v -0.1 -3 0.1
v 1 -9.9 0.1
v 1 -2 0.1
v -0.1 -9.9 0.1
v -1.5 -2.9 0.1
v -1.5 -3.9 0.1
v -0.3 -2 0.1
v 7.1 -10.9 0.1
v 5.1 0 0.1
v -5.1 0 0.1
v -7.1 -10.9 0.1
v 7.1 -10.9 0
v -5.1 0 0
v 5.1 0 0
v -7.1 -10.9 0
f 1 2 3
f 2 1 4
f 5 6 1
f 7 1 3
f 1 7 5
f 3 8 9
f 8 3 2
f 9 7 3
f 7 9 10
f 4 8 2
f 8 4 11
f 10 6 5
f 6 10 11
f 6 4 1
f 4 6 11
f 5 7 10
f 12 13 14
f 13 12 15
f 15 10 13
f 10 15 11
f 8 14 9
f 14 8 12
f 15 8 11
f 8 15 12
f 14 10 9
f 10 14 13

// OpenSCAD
use <../lib.scad>
function ldraw_lib__4141242a() = [
// 0 Sticker Minifig Torso with White "1"
// 0 Name: 4141242a.dat
// 0 Author: Michael Heidemann [mikeheide]
// 0 !LDRAW_ORG Part UPDATE 2013-02
// 0 !LICENSE Licensed under CC BY 4.0 : see CAreadme.txt
// 
// 0 BFC CERTIFY CCW
  [0,"BFC","CERTIFY"],
  [0,"BFC","CCW"],
// 
// 0 !HISTORY 2013-12-23 [PTadmin] Official Update 2013-02
// 
// 
// 4 15 2.5 -0.25 -24.75 2.5 -0.25 -5 -0.25 -0.25 -7.5 -0.25 -0.25 -24.75
  [4,15,2.5,-0.25,-24.75,2.5,-0.25,-5,-0.25,-0.25,-7.5,-0.25,-0.25,-24.75],
// 3 15 -3.75 -0.25 -7.25 -3.75 -0.25 -9.75 -0.25 -0.25 -7.5
  [3,15,-3.75,-0.25,-7.25,-3.75,-0.25,-9.75,-0.25,-0.25,-7.5],
// 4 15 -3.75 -0.25 -7.25 -0.25 -0.25 -7.5 2.5 -0.25 -5 -0.75 -0.25 -5
  [4,15,-3.75,-0.25,-7.25,-0.25,-0.25,-7.5,2.5,-0.25,-5,-0.75,-0.25,-5],
// 4 16 2.5 -0.25 -24.75 17.75 -0.25 -27.25 12.75 -0.25 0 2.5 -0.25 -5
  [4,16,2.5,-0.25,-24.75,17.75,-0.25,-27.25,12.75,-0.25,0,2.5,-0.25,-5],
// 4 16 12.75 -0.25 0 -12.75 -0.25 0 -0.75 -0.25 -5 2.5 -0.25 -5
  [4,16,12.75,-0.25,0,-12.75,-0.25,0,-0.75,-0.25,-5,2.5,-0.25,-5],
// 4 16 -0.25 -0.25 -24.75 -17.75 -0.25 -27.25 17.75 -0.25 -27.25 2.5 -0.25 -24.75
  [4,16,-0.25,-0.25,-24.75,-17.75,-0.25,-27.25,17.75,-0.25,-27.25,2.5,-0.25,-24.75],
// 4 16 -12.75 -0.25 0 -17.75 -0.25 -27.25 -3.75 -0.25 -9.75 -3.75 -0.25 -7.25
  [4,16,-12.75,-0.25,0,-17.75,-0.25,-27.25,-3.75,-0.25,-9.75,-3.75,-0.25,-7.25],
// 4 16 -0.25 -0.25 -24.75 -0.25 -0.25 -7.5 -3.75 -0.25 -9.75 -17.75 -0.25 -27.25
  [4,16,-0.25,-0.25,-24.75,-0.25,-0.25,-7.5,-3.75,-0.25,-9.75,-17.75,-0.25,-27.25],
// 3 16 -3.75 -0.25 -7.25 -0.75 -0.25 -5 -12.75 -0.25 0
  [3,16,-3.75,-0.25,-7.25,-0.75,-0.25,-5,-12.75,-0.25,0],
// 4 16 12.75 0 0 17.75 0 -27.25 -17.75 0 -27.25 -12.75 0 0
  [4,16,12.75,0,0,17.75,0,-27.25,-17.75,0,-27.25,-12.75,0,0],
// 4 16 -12.75 0 0 -17.75 0 -27.25 -17.75 -0.25 -27.25 -12.75 -0.25 0
  [4,16,-12.75,0,0,-17.75,0,-27.25,-17.75,-0.25,-27.25,-12.75,-0.25,0],
// 4 16 12.75 -0.25 0 17.75 -0.25 -27.25 17.75 0 -27.25 12.75 0 0
  [4,16,12.75,-0.25,0,17.75,-0.25,-27.25,17.75,0,-27.25,12.75,0,0],
// 4 16 -17.75 0 -27.25 17.75 0 -27.25 17.75 -0.25 -27.25 -17.75 -0.25 -27.25
  [4,16,-17.75,0,-27.25,17.75,0,-27.25,17.75,-0.25,-27.25,-17.75,-0.25,-27.25],
// 4 16 12.75 0 0 -12.75 0 0 -12.75 -0.25 0 12.75 -0.25 0
  [4,16,12.75,0,0,-12.75,0,0,-12.75,-0.25,0,12.75,-0.25,0],
// 0 // Pattern created wholly or in part by Quad2Dat
// 0 // Thanks James
];
module ldraw_lib__4141242a(step=0, col=false, unit=2/5, alt=false, line=0.2, solid=!$preview)
    makepoly(ldraw_lib__4141242a(), step=step, col=col, unit=unit, alt=alt, line=line, solid=solid);
ldraw_lib__4141242a(line=0.2);
